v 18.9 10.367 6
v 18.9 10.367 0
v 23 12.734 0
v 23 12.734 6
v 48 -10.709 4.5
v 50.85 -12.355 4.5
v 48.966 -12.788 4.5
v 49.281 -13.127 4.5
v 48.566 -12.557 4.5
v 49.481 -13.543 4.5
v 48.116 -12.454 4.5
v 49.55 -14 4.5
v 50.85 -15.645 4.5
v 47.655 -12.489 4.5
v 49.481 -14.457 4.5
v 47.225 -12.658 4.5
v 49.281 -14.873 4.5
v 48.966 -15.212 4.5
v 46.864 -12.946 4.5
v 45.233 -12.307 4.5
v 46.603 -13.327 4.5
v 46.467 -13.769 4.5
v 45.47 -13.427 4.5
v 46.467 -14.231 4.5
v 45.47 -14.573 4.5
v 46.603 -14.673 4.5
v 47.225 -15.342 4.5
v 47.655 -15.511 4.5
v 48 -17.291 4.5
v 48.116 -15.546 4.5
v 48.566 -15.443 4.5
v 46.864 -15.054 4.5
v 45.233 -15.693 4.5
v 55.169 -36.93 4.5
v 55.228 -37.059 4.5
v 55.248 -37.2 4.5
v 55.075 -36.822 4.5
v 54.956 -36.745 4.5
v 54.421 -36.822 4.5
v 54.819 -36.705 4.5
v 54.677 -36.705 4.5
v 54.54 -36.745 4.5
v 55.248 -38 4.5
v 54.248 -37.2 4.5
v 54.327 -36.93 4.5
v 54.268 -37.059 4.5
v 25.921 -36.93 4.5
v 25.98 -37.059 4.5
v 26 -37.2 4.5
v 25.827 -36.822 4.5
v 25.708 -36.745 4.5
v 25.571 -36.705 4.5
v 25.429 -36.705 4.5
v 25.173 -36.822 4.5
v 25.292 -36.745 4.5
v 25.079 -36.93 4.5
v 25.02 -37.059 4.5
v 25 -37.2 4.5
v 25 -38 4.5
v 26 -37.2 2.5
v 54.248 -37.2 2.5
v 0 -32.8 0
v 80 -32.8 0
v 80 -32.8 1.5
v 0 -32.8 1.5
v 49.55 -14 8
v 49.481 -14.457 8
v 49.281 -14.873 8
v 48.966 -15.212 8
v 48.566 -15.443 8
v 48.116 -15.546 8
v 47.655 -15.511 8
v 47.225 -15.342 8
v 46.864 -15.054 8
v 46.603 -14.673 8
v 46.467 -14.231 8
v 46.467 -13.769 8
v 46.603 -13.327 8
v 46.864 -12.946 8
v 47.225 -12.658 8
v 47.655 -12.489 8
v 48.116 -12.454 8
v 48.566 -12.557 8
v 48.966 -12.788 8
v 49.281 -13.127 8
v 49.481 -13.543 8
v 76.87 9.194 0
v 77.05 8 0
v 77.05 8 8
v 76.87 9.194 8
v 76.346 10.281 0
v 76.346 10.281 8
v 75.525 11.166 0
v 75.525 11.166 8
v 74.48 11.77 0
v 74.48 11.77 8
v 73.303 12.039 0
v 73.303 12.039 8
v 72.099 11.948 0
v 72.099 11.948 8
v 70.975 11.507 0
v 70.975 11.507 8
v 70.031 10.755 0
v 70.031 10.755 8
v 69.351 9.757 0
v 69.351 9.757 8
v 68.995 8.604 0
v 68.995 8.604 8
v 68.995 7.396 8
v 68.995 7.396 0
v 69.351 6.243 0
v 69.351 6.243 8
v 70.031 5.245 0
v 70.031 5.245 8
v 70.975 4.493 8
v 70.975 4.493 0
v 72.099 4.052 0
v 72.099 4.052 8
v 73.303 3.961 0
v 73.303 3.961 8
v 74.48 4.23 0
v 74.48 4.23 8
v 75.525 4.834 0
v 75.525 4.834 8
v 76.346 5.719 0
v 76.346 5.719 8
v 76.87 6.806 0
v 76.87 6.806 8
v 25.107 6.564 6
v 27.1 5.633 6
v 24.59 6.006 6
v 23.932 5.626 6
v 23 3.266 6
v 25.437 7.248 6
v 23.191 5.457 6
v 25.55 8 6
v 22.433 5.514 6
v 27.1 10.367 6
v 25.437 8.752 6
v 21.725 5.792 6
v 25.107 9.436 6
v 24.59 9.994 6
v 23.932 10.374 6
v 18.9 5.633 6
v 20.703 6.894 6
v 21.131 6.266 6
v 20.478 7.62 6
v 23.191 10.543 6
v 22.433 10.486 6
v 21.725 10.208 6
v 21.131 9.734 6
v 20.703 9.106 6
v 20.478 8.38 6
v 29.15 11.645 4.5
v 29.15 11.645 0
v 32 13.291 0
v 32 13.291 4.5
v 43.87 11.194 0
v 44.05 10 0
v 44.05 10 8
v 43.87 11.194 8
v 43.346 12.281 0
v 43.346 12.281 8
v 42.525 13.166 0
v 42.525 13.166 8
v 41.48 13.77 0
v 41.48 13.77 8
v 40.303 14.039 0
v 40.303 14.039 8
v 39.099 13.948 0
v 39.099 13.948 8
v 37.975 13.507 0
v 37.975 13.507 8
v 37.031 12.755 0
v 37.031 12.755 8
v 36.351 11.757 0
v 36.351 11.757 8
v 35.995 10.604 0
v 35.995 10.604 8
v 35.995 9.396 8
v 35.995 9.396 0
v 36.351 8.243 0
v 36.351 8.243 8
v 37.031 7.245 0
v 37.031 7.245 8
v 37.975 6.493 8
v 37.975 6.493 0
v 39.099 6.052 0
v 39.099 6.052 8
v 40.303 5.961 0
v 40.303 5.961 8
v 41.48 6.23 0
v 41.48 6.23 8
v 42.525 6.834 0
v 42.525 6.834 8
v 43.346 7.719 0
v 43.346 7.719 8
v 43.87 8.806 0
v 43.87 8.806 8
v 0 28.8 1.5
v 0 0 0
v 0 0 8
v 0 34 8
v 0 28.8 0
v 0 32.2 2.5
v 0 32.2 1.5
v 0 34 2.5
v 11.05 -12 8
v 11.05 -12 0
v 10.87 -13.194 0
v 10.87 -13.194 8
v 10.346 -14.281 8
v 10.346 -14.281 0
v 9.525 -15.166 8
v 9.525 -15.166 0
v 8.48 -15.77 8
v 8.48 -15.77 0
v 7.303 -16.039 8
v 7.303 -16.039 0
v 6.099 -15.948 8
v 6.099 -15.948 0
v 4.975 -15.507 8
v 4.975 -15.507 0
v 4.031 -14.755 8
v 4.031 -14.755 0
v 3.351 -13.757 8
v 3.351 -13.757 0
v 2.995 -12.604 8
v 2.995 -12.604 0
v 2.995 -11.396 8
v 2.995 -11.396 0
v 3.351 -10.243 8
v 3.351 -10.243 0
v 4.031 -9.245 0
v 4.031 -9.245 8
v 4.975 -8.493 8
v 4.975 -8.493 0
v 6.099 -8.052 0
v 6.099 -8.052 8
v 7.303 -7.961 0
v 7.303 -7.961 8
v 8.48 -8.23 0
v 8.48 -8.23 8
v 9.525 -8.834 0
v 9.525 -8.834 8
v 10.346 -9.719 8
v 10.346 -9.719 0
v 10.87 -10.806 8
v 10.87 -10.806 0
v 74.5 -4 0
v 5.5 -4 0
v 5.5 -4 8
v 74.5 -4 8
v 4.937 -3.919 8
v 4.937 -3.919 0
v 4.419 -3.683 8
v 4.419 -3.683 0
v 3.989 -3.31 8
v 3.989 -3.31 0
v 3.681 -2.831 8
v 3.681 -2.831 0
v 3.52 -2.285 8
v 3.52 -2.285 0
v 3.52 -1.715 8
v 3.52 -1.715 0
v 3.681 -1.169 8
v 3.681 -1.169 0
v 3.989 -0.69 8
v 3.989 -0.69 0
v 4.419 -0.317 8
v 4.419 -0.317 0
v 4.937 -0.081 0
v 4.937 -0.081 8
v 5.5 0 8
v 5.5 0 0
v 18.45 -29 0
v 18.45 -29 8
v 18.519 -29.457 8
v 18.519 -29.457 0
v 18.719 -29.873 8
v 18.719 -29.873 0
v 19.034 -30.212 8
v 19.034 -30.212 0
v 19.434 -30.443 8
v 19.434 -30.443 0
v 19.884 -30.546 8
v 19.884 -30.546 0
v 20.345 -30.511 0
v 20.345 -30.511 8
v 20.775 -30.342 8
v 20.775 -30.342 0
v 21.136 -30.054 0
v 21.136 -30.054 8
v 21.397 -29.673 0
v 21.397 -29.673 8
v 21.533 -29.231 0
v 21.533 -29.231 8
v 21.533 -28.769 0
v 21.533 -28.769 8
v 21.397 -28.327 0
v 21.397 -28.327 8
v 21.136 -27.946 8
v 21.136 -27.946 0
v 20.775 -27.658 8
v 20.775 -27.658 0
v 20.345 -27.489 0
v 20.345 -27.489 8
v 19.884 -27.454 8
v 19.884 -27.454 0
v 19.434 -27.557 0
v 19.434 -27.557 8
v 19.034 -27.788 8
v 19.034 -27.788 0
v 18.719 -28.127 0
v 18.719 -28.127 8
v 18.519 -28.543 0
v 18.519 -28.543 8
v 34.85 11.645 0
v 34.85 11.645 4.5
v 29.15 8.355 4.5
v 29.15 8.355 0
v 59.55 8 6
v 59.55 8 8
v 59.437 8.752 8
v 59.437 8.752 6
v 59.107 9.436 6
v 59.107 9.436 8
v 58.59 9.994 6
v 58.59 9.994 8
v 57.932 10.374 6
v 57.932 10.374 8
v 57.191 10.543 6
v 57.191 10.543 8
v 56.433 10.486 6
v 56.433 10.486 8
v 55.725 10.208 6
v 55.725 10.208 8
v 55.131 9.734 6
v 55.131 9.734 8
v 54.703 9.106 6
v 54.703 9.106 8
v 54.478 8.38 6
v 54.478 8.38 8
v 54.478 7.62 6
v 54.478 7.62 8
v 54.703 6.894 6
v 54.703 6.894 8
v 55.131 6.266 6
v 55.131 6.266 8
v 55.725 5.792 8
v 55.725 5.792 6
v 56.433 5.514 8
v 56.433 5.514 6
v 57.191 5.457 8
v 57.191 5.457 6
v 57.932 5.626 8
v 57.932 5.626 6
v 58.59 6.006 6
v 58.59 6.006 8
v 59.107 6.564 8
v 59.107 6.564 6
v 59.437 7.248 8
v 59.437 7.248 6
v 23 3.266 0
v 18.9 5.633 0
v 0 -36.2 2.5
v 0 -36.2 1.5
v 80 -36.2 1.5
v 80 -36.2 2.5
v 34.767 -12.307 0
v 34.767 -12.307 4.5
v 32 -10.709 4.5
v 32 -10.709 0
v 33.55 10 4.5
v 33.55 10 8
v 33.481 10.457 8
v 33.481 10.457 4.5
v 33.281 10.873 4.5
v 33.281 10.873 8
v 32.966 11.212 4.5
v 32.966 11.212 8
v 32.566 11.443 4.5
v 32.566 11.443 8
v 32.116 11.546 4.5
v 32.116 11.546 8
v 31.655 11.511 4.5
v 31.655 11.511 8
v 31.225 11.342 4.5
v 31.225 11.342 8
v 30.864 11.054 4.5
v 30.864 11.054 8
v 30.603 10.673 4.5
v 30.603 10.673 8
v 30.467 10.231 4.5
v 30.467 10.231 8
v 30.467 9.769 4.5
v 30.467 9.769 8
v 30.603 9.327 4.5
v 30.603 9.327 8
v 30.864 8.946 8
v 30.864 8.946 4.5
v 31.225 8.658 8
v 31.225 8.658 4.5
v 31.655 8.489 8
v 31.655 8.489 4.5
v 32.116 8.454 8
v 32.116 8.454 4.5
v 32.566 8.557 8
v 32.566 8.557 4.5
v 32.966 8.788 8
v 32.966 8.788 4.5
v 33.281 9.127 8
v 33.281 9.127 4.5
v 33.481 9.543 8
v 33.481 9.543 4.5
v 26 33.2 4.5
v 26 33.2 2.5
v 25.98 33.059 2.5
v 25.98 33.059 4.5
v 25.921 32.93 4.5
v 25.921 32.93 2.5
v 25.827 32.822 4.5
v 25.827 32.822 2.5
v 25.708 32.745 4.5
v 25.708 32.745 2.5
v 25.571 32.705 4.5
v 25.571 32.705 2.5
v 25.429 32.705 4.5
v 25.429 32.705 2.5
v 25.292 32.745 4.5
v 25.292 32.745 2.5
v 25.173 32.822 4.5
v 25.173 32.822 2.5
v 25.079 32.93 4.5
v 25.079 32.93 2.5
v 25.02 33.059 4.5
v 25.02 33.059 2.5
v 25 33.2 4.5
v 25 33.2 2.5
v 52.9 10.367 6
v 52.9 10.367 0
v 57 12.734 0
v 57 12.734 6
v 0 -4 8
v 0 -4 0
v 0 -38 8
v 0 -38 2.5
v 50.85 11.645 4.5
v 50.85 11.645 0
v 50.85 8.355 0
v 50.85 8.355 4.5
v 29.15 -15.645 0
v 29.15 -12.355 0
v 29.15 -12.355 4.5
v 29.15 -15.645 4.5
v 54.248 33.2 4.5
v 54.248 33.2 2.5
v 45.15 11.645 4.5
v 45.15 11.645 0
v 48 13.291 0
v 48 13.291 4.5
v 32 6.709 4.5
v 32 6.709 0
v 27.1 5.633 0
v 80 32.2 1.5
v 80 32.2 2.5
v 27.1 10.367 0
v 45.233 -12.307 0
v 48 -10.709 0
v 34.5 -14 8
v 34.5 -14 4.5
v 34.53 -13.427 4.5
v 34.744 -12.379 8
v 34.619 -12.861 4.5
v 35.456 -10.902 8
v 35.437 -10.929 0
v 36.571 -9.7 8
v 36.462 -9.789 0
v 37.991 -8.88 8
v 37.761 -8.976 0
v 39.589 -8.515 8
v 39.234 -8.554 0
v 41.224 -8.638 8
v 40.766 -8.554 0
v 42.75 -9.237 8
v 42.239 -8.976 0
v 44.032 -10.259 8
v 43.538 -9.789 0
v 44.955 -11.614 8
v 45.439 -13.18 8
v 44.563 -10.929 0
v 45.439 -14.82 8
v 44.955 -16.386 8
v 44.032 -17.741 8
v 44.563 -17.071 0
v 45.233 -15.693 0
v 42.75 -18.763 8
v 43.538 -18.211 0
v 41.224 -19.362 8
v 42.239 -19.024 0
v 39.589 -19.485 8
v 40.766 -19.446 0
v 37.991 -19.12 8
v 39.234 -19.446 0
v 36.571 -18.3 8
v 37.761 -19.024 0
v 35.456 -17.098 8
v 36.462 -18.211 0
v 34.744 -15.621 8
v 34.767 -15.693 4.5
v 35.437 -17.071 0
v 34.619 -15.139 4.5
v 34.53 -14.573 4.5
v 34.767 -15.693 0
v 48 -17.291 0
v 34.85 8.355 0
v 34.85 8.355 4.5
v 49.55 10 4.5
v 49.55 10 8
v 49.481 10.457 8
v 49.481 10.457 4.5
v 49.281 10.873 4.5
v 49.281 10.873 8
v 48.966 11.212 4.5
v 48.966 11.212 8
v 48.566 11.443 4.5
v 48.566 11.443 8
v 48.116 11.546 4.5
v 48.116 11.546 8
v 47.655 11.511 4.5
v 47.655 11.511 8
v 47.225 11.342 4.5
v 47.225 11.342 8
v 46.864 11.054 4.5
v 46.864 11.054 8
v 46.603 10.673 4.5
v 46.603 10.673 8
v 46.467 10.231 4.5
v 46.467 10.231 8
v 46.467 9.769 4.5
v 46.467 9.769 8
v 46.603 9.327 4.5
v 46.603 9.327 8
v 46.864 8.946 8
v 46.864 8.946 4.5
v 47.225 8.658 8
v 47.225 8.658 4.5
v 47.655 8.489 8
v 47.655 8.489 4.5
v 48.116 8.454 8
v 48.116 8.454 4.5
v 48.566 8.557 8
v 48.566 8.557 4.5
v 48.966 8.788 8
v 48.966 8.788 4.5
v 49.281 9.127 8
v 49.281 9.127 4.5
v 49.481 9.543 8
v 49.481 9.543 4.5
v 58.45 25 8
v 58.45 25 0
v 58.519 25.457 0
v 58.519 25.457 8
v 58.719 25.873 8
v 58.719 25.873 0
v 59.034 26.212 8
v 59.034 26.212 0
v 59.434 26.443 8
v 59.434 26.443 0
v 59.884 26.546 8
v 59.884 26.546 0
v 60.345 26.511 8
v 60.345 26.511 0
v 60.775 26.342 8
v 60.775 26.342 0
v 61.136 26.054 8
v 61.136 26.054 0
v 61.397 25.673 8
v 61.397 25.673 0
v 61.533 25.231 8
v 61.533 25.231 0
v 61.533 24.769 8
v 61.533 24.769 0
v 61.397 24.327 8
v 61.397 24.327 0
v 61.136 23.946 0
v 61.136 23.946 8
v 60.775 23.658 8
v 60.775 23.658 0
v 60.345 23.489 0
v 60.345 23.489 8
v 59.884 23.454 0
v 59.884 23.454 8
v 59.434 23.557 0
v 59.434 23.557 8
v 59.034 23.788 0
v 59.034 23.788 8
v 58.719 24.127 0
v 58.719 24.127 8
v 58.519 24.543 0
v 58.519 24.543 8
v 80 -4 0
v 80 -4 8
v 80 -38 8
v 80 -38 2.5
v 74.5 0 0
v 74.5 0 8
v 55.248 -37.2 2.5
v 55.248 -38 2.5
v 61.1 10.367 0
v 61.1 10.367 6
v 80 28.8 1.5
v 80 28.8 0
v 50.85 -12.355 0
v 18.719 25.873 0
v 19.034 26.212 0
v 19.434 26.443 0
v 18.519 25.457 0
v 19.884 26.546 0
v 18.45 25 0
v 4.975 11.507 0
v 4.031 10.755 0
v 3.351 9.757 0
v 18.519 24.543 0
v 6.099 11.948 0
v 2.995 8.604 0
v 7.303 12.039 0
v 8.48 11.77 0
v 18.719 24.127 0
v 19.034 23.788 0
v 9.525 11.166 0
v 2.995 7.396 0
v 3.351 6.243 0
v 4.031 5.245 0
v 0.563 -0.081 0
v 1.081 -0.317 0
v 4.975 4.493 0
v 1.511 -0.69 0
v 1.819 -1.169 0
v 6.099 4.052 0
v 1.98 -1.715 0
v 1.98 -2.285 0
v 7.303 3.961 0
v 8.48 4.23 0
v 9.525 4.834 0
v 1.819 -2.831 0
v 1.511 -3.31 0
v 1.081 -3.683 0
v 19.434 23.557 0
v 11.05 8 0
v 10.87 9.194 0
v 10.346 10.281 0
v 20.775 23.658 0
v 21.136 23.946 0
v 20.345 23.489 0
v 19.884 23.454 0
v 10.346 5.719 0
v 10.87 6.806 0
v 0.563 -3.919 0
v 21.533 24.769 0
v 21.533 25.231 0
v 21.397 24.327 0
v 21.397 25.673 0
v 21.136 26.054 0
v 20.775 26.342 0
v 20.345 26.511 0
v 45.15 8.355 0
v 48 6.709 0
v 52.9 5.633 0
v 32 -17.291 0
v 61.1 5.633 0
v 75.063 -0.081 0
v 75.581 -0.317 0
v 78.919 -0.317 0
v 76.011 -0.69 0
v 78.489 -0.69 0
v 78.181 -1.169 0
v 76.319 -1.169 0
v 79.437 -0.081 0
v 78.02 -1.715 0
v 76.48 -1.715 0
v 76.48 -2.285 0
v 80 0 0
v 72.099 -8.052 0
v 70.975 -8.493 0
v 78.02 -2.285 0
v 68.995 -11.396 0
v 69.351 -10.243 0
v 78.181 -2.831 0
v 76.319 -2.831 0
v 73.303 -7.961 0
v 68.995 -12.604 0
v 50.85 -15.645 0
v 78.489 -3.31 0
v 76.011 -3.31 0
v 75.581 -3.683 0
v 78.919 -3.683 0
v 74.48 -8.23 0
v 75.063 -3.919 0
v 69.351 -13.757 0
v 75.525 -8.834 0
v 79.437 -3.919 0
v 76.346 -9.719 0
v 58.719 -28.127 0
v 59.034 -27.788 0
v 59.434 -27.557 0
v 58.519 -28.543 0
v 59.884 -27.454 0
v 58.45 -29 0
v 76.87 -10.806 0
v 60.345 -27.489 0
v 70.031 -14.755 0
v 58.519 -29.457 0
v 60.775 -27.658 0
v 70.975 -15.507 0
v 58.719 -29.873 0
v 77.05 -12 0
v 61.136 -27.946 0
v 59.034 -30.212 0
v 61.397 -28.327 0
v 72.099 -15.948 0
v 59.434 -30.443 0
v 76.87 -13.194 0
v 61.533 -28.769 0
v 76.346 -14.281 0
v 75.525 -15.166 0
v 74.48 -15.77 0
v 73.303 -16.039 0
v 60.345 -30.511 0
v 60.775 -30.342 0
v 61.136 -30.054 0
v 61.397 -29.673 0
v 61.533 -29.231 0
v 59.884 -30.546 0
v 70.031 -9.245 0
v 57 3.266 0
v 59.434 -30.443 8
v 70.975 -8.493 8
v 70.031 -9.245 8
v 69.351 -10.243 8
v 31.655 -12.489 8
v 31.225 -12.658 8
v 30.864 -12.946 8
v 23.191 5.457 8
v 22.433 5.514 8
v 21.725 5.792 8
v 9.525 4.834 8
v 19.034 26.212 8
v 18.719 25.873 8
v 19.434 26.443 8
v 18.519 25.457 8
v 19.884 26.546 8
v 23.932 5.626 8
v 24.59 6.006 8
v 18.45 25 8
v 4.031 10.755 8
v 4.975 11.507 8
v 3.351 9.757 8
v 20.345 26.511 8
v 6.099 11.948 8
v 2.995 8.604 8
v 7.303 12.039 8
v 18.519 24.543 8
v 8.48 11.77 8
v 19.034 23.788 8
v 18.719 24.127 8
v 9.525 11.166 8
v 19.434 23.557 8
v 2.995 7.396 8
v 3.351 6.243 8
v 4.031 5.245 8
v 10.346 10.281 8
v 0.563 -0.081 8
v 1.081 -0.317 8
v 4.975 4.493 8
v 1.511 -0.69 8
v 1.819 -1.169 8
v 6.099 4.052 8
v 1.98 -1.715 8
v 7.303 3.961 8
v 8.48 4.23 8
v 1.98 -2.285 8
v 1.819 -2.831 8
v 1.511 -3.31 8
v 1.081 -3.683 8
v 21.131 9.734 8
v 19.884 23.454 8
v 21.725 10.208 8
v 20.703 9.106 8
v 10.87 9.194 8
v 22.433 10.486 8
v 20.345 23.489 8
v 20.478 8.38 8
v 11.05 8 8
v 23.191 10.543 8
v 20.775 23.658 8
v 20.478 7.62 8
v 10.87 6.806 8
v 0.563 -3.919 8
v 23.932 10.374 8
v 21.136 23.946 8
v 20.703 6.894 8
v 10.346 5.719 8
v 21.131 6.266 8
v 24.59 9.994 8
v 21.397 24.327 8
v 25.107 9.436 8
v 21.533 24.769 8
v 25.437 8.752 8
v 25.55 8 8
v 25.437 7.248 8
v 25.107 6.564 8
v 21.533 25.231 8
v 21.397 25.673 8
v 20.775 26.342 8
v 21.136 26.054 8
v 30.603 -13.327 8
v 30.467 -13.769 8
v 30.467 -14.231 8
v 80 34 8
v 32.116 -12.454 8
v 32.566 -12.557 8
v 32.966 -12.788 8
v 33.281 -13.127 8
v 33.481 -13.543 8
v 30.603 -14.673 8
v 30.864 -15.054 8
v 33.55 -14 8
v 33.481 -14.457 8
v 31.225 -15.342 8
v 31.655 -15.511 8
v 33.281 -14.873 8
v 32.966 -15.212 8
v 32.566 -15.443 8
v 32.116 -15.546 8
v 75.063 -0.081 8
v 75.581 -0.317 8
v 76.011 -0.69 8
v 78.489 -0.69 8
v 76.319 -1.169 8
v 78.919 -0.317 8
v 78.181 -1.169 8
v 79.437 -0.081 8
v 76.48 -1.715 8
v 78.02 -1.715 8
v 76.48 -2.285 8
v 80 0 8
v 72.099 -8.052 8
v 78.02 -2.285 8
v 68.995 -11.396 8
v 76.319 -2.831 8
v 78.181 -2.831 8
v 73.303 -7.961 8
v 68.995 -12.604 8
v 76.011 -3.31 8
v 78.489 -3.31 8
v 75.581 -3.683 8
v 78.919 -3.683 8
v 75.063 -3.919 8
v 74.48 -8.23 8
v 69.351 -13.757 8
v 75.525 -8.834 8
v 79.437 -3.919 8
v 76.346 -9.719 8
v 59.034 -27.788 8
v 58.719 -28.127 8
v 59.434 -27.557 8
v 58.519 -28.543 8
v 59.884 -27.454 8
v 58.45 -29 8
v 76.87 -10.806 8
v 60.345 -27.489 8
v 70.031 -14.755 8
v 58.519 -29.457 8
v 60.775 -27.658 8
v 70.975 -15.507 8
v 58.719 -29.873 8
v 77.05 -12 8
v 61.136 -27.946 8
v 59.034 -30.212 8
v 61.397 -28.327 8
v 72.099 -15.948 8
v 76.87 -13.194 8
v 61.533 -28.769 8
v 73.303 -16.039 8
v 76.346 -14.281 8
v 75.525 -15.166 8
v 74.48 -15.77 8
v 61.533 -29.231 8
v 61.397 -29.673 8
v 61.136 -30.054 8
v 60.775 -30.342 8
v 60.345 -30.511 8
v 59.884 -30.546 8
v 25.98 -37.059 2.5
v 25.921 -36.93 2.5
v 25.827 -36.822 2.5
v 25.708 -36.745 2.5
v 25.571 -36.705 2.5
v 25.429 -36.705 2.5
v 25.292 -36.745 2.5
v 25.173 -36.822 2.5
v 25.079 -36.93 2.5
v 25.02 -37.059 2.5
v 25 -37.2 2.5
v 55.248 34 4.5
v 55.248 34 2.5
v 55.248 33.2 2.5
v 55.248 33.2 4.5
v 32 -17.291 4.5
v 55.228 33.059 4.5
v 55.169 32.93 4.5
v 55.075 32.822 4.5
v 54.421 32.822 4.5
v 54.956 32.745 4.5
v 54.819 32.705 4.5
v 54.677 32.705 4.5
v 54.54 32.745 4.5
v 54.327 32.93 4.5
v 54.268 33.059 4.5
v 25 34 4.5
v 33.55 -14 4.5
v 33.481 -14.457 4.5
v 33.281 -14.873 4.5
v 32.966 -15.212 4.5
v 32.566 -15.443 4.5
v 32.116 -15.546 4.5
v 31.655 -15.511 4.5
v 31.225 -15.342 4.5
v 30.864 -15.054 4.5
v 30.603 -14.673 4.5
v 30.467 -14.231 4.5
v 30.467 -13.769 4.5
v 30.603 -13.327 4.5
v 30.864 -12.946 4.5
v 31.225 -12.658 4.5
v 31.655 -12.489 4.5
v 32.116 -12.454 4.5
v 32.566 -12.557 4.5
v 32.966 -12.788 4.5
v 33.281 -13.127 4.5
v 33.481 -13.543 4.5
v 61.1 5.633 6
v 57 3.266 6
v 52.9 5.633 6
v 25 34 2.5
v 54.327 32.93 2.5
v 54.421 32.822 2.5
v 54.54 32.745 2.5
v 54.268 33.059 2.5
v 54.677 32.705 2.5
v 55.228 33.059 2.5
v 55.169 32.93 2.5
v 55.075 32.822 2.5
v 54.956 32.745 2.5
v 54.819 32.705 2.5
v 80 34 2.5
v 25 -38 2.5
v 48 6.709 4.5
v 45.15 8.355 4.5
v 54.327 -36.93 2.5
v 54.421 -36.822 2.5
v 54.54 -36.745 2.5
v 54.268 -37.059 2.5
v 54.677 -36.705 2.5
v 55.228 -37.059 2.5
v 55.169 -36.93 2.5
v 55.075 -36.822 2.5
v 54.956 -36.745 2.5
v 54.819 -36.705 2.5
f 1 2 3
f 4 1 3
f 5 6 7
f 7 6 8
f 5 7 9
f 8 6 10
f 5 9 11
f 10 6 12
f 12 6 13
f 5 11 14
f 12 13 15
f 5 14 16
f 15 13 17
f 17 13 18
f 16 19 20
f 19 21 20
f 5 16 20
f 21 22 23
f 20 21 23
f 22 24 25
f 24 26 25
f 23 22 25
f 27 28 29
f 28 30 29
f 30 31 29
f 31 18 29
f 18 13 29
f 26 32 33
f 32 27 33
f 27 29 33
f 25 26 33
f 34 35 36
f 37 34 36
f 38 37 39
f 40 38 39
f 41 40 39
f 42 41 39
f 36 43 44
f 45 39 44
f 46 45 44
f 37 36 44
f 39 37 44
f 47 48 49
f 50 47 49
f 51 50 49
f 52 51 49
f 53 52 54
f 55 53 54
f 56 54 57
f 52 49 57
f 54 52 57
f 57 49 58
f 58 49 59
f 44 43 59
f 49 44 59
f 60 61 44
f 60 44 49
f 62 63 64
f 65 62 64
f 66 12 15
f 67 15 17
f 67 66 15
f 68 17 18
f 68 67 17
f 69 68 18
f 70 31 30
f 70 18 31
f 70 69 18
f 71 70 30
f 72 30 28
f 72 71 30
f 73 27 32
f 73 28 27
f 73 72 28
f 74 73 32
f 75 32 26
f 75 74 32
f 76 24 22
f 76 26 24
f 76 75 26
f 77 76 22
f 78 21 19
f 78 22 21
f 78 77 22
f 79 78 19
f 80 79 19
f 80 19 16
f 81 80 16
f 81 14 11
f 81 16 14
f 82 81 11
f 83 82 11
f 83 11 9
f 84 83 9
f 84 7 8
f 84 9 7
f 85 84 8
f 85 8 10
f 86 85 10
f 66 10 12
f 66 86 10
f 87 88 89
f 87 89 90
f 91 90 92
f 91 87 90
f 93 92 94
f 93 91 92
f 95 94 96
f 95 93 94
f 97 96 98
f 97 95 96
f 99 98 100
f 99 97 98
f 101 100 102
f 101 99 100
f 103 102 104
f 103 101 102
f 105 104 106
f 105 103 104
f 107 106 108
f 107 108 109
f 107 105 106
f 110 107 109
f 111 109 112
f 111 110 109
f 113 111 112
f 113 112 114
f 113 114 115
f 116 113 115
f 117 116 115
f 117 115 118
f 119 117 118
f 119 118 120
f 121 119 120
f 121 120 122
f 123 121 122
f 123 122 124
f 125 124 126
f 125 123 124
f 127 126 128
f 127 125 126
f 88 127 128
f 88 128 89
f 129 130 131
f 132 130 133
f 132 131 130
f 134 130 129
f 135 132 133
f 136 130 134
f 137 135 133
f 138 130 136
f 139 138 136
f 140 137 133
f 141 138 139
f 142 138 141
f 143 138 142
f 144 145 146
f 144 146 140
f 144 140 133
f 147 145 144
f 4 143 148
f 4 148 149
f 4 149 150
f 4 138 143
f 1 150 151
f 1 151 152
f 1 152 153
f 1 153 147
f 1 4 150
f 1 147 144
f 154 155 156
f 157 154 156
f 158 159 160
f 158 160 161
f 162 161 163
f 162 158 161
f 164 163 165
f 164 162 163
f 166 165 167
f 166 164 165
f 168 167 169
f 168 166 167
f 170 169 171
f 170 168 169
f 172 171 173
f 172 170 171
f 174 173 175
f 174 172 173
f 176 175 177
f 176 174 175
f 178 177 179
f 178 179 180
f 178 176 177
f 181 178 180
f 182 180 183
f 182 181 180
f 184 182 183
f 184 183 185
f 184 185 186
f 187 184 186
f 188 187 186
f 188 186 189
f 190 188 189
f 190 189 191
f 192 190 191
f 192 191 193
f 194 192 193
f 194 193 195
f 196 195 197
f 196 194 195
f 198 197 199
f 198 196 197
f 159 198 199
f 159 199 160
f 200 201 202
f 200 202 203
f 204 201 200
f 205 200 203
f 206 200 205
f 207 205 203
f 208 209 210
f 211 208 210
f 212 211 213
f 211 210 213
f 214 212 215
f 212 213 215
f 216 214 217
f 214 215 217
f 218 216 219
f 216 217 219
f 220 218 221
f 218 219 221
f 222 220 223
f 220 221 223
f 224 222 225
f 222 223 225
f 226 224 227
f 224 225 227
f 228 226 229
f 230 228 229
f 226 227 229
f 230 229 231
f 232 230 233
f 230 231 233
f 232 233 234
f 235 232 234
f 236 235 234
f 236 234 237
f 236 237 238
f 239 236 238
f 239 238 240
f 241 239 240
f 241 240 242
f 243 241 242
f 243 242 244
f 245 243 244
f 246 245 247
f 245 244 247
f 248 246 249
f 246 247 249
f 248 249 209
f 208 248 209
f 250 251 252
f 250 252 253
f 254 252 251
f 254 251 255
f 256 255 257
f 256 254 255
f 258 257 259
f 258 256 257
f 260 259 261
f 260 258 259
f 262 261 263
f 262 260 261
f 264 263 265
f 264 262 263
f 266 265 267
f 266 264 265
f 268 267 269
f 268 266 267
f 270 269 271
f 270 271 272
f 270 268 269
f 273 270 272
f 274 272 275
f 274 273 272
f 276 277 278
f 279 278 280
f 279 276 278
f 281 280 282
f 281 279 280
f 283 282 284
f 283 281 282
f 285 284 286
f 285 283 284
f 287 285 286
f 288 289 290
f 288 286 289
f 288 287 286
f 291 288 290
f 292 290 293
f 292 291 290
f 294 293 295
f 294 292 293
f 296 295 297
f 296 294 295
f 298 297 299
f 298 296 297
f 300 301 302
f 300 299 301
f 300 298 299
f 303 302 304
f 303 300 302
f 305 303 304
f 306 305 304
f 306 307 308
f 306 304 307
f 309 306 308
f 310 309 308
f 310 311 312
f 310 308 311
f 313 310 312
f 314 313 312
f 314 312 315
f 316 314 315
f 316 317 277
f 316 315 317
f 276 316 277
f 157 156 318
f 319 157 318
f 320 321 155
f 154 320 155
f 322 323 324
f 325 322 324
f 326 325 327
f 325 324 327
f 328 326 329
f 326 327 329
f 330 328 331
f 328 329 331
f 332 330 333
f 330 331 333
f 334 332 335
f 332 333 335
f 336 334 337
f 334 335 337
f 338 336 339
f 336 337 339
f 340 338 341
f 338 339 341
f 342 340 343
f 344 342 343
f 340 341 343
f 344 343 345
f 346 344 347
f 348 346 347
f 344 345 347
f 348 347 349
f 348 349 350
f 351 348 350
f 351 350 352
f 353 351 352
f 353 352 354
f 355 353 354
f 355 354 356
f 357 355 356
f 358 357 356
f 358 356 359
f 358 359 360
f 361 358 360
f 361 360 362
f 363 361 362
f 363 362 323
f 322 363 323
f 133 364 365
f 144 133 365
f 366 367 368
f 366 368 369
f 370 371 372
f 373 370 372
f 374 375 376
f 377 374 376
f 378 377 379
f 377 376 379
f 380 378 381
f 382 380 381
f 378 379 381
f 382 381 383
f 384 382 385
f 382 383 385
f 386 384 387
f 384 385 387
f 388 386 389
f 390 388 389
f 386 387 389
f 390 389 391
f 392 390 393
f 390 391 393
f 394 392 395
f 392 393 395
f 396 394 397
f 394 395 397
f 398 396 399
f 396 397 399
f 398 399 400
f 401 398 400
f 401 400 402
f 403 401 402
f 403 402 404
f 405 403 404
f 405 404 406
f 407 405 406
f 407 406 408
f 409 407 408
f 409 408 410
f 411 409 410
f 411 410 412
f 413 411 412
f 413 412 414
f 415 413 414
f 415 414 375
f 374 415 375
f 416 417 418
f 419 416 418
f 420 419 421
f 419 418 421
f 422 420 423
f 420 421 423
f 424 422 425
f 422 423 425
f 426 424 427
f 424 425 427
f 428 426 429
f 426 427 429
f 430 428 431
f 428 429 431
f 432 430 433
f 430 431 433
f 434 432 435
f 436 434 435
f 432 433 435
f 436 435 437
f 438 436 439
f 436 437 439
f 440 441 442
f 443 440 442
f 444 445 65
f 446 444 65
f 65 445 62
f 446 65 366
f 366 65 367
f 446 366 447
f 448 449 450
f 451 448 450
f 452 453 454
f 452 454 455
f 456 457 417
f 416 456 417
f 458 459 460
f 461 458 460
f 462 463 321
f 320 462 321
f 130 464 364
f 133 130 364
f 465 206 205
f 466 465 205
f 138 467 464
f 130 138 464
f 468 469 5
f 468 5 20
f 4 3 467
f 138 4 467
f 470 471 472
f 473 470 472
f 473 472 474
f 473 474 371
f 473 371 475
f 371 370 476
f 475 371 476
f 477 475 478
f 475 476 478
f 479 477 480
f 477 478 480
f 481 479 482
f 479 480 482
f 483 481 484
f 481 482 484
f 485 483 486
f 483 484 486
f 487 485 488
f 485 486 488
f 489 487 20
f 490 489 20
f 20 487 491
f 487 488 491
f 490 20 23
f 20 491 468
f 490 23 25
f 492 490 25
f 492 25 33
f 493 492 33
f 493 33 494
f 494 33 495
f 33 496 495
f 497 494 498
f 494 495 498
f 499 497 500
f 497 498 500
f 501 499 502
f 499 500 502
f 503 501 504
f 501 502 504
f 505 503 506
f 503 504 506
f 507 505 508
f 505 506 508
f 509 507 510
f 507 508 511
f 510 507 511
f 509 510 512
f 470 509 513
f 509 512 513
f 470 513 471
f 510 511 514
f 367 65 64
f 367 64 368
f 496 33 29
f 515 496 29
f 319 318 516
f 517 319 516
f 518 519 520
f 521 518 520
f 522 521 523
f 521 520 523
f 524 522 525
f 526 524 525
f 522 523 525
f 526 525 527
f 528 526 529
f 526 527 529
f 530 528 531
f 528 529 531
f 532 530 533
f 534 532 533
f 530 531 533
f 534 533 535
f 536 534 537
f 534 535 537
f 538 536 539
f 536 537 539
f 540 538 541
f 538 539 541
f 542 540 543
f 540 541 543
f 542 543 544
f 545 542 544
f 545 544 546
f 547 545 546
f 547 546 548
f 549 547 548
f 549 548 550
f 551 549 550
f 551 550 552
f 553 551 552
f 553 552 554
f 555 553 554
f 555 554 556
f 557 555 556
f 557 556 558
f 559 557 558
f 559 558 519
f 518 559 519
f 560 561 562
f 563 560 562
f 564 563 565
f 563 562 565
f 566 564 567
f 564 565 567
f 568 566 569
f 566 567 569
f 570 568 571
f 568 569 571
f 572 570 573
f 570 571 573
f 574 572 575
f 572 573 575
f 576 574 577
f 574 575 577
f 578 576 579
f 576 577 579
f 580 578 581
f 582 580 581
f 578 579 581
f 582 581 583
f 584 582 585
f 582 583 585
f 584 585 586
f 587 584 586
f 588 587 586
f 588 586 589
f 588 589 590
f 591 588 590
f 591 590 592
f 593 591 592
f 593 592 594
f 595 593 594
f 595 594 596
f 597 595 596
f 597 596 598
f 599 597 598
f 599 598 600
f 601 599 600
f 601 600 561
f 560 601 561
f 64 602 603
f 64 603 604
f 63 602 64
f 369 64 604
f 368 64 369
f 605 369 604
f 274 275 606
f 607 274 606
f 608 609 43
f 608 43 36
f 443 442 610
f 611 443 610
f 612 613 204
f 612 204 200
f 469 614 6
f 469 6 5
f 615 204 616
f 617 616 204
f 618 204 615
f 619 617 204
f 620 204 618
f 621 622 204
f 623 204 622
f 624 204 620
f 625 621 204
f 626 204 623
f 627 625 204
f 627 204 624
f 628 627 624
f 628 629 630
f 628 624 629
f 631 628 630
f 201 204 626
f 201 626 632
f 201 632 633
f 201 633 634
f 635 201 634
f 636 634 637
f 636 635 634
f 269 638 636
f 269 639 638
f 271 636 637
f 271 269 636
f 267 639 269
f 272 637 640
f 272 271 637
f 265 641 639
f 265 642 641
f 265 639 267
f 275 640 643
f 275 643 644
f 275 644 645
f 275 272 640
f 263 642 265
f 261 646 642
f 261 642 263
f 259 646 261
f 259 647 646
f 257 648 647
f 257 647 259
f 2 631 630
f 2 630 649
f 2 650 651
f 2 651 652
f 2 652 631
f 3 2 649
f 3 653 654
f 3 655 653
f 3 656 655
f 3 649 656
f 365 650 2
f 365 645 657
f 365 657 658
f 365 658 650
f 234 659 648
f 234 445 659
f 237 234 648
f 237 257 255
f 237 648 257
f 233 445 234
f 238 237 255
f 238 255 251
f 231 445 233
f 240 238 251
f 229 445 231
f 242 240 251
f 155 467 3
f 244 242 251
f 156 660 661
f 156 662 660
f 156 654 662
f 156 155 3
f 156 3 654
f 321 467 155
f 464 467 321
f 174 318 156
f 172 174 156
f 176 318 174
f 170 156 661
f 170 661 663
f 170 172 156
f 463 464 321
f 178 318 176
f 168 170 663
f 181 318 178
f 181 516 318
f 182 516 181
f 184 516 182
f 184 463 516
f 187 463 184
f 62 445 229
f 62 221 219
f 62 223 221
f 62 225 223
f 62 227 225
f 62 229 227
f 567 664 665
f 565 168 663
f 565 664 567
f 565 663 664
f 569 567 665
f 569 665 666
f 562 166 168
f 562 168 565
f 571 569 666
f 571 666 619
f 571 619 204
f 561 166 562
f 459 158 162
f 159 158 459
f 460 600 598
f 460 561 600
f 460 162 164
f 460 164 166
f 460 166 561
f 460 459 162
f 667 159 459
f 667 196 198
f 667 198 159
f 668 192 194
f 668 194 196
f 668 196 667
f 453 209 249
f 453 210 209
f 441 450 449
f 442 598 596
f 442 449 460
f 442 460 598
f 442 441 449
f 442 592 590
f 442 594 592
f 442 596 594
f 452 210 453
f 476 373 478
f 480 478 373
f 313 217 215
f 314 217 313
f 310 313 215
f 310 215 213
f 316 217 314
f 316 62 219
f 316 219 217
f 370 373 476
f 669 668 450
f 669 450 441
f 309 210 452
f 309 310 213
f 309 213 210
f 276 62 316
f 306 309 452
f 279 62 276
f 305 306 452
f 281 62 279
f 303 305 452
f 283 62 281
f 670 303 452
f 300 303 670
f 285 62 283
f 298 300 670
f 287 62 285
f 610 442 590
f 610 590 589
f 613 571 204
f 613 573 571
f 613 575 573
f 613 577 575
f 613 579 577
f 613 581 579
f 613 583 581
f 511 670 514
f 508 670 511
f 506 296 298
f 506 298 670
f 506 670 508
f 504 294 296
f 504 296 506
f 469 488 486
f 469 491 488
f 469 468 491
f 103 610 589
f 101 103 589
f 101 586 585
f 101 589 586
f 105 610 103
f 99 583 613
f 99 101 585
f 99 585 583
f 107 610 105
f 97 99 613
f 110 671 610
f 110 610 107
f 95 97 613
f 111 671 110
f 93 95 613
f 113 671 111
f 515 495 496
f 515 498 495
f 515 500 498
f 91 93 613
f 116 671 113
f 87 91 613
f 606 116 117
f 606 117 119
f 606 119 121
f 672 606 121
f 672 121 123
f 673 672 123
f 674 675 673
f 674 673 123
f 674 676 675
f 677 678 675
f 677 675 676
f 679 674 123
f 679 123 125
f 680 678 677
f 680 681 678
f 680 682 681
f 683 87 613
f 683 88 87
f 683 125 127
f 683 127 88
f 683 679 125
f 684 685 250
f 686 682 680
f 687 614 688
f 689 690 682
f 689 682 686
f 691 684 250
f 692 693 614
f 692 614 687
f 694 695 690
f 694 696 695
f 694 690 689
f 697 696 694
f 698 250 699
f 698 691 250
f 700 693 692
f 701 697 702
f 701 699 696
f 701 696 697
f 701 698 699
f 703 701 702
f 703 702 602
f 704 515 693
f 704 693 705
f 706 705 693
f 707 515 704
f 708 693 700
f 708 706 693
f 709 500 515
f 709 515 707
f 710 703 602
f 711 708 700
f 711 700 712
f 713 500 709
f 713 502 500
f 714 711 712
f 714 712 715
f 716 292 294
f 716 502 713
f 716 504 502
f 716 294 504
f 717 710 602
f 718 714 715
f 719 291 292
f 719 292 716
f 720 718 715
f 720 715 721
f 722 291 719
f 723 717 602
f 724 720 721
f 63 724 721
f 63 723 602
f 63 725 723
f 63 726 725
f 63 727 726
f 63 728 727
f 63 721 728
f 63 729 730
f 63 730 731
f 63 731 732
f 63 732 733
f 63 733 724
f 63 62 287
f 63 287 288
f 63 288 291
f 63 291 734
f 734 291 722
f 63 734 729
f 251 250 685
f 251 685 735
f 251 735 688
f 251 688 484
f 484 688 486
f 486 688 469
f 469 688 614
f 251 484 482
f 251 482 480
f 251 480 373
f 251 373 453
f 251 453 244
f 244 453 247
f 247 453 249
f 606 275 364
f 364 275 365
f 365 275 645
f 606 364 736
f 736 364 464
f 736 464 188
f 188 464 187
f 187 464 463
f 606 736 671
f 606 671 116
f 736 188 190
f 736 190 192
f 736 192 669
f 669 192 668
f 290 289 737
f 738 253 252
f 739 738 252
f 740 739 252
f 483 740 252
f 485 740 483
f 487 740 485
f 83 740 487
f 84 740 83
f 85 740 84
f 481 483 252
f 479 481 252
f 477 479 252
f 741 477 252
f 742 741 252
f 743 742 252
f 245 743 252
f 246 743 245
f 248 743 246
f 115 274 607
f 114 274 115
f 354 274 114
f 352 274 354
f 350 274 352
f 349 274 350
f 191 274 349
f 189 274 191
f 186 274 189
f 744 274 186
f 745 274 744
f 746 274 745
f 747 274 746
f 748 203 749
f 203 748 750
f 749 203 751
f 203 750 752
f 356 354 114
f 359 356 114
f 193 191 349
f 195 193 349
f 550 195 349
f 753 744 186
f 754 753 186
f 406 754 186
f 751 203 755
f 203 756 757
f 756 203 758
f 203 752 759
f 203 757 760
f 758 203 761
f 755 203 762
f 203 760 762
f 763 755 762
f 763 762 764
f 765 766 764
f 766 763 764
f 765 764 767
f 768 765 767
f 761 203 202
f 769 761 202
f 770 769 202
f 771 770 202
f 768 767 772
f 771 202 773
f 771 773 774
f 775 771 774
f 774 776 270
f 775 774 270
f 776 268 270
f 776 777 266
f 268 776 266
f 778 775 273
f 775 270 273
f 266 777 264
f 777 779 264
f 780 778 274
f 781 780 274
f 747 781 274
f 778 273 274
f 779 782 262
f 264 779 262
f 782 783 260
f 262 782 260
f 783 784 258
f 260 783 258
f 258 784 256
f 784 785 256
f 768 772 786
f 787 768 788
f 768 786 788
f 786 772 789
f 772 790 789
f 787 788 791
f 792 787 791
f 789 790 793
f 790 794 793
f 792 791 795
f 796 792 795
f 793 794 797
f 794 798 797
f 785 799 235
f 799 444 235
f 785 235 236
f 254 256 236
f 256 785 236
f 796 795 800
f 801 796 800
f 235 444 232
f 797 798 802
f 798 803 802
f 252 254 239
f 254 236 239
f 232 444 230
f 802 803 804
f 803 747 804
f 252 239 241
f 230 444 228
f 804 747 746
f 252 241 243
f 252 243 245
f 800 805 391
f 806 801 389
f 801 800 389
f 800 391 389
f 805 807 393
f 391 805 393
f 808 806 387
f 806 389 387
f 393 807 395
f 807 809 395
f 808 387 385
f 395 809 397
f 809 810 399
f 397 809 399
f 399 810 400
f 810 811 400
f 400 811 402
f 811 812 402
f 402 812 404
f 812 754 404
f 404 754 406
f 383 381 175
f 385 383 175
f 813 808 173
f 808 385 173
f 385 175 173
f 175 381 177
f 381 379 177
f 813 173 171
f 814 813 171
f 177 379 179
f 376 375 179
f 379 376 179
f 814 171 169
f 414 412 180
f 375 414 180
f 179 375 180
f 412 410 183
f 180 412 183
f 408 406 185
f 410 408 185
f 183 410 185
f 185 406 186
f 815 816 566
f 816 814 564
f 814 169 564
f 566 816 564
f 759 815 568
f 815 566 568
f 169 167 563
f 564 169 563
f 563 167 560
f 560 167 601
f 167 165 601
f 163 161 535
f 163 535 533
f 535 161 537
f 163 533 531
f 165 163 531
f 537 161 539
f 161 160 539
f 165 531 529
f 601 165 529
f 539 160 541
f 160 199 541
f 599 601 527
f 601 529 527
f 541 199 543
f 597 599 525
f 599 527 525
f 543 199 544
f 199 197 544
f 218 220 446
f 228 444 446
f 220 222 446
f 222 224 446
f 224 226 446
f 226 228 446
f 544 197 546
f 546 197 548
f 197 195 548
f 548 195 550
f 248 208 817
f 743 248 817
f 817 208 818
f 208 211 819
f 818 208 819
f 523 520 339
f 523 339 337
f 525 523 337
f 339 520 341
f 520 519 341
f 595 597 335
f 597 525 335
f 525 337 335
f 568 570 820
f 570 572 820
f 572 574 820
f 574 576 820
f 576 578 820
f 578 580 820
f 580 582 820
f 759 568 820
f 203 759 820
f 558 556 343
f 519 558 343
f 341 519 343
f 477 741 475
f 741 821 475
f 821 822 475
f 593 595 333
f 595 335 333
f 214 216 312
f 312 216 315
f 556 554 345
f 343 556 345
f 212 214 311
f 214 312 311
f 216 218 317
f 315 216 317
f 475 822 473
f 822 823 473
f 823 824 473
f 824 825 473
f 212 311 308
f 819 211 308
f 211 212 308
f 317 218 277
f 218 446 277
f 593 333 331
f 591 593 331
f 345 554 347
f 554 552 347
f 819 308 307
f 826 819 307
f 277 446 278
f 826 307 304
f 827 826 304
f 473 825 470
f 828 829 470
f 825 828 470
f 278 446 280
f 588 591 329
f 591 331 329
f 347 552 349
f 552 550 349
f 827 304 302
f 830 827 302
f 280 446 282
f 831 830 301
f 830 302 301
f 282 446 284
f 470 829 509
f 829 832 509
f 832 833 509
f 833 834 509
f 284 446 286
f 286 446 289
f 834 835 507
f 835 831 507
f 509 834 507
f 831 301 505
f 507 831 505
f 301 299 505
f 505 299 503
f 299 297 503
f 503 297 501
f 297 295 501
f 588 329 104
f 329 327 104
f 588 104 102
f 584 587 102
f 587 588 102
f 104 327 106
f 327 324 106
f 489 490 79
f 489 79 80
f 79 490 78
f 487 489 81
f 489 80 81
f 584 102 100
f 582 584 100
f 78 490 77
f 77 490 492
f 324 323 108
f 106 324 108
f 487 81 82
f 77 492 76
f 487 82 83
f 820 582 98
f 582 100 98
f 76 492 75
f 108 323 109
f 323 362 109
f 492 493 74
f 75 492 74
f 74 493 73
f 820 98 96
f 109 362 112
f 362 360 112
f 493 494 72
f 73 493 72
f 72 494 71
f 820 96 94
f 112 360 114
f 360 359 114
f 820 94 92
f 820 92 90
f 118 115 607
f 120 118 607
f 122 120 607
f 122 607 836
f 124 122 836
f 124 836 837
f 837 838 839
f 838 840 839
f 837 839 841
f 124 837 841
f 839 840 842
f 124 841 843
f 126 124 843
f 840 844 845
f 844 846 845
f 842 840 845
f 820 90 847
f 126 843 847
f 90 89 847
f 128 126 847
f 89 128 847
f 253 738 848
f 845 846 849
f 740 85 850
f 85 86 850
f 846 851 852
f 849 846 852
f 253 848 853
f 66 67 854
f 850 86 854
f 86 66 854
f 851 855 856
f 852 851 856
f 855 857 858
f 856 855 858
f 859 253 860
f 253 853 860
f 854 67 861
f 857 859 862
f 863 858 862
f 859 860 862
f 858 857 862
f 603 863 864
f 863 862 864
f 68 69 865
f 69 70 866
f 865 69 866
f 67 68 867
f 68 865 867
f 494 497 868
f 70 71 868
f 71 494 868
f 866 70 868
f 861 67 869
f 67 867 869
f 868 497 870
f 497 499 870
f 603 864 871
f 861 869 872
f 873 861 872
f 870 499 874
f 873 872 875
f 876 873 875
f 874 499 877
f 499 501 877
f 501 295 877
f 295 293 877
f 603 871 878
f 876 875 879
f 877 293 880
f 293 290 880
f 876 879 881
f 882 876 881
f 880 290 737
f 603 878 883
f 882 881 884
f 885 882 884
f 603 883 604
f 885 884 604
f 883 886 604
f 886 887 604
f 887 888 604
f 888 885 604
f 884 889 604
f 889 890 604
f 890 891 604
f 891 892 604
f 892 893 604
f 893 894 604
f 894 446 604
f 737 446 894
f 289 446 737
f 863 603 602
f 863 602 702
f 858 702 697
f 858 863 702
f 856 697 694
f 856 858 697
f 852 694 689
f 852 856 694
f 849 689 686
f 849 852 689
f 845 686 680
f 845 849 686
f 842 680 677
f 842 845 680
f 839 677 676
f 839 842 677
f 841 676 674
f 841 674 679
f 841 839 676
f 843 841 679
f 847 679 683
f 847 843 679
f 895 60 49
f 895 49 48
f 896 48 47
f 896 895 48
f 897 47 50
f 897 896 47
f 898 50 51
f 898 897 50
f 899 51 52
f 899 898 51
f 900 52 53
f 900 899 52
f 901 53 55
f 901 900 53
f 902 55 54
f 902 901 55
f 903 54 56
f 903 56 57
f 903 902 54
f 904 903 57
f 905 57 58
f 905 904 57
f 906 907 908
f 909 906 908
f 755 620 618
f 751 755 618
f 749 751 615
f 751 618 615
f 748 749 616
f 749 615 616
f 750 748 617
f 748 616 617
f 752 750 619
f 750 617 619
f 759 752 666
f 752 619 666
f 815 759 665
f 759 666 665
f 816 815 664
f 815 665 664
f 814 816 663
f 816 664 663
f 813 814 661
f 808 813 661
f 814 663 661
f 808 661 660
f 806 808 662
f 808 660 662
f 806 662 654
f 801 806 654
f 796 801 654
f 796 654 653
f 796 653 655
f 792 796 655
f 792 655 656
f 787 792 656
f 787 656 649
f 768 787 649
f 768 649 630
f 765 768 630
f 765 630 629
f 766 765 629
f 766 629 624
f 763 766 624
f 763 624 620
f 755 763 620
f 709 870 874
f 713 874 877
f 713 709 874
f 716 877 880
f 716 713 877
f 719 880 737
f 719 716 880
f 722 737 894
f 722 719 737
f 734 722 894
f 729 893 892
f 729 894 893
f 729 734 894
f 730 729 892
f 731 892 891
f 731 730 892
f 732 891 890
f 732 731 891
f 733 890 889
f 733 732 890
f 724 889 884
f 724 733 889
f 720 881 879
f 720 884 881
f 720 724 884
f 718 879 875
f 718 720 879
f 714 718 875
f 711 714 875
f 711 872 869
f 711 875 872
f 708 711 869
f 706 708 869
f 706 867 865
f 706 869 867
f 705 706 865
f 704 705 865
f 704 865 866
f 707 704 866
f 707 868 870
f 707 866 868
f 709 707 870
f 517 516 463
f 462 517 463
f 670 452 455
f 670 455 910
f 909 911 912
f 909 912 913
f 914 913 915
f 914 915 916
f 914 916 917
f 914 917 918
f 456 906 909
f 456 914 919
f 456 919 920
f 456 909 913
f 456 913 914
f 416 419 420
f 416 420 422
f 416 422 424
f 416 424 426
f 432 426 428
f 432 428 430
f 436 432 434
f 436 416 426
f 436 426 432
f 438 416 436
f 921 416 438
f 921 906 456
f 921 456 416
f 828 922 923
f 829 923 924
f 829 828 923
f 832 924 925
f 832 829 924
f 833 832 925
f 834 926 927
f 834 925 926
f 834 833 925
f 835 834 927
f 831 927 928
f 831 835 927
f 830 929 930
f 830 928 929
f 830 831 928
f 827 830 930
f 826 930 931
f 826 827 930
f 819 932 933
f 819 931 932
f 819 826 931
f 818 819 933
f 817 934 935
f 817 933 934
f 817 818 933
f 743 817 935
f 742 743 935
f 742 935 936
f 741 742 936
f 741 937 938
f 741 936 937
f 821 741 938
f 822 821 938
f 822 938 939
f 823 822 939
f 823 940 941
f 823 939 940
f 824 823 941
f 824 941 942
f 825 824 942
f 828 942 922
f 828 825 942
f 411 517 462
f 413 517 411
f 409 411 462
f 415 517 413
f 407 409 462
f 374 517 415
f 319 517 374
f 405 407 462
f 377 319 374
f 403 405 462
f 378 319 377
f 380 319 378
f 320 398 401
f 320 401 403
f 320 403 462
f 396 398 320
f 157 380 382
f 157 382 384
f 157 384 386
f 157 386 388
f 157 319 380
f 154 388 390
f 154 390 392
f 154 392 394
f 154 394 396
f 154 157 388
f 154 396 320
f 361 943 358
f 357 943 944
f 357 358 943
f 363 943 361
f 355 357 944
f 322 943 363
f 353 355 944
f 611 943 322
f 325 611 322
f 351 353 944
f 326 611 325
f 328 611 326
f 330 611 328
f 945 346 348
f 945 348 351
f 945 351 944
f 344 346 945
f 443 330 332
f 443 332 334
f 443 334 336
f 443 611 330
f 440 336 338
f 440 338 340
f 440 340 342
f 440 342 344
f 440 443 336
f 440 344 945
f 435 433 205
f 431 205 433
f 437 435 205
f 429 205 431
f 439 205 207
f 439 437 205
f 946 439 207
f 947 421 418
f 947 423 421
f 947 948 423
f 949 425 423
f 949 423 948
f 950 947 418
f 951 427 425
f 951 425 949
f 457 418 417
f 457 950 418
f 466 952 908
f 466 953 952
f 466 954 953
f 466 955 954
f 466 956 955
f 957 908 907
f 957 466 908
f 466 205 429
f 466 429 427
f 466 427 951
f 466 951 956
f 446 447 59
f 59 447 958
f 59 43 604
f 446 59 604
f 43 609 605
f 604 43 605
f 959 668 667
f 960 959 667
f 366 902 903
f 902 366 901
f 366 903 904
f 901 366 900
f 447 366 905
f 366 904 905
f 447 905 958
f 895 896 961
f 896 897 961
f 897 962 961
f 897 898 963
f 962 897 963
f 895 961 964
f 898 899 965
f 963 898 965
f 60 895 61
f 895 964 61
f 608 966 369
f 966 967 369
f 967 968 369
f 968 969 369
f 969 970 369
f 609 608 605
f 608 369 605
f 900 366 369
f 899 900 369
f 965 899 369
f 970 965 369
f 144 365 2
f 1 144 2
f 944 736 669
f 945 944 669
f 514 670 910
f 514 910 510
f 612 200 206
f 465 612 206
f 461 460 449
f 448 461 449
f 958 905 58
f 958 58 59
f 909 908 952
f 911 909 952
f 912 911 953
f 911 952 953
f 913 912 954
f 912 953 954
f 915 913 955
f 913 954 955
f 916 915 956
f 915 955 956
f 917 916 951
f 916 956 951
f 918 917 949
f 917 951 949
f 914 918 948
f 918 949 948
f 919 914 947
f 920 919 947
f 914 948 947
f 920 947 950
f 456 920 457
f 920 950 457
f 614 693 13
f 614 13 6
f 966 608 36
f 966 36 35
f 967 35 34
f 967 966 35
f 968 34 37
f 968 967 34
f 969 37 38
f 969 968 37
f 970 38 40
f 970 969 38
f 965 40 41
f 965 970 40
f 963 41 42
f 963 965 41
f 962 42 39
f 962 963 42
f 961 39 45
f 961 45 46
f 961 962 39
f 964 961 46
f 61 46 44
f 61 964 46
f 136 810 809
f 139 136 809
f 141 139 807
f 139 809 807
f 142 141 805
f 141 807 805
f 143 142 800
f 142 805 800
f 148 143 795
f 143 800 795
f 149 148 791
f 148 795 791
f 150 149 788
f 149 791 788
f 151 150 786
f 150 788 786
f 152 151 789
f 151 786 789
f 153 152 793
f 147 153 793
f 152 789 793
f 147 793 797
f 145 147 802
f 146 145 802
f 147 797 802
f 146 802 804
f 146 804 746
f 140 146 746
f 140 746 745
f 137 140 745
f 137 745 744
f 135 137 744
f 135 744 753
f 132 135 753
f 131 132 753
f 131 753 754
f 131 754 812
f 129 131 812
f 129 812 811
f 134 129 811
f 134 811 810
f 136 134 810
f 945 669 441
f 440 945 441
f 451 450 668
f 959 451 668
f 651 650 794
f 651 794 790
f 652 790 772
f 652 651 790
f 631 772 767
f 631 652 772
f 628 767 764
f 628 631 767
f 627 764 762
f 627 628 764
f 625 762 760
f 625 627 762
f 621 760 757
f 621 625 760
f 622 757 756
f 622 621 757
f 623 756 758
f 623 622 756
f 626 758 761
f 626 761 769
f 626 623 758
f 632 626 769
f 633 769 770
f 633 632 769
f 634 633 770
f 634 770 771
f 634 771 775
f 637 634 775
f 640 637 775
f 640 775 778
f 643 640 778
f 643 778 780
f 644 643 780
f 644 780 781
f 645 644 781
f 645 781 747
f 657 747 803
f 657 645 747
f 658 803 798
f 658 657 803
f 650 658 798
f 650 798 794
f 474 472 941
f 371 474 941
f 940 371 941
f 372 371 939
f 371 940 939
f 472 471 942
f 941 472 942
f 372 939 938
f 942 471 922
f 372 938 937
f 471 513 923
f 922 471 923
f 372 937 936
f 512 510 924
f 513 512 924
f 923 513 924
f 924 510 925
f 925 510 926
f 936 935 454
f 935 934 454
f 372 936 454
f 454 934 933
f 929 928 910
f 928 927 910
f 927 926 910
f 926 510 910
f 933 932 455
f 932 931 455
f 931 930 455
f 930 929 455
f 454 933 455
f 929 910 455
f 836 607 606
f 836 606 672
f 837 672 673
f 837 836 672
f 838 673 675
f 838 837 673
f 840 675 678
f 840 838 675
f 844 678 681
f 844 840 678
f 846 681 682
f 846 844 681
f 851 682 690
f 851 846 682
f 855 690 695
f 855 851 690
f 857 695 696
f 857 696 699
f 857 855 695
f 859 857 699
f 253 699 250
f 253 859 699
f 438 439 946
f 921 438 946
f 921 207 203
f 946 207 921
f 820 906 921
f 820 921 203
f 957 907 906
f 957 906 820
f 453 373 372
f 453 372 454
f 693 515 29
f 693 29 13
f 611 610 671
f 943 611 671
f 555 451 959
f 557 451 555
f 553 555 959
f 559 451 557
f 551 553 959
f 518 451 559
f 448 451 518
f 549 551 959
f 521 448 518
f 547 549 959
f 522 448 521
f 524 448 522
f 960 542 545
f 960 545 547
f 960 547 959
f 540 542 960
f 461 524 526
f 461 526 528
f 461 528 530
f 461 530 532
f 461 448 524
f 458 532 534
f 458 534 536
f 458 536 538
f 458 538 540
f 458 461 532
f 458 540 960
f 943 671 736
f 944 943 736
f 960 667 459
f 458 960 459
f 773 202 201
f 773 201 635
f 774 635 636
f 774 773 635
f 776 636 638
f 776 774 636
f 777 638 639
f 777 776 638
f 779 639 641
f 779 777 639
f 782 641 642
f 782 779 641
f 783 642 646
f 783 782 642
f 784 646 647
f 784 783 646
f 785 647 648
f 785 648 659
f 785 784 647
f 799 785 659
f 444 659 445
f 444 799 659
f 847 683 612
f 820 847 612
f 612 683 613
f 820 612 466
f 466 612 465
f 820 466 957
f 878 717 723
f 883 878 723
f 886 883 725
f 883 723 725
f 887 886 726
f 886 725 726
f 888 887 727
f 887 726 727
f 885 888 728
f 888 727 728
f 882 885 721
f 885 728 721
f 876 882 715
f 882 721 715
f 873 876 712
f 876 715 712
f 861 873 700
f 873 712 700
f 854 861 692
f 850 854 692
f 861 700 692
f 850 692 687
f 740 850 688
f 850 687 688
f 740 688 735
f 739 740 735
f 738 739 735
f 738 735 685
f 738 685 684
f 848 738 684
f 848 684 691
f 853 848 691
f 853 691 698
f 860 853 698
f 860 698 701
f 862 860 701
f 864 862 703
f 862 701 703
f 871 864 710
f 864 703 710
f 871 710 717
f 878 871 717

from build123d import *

# Parameters (mm, degrees)
SKETCH_2_W           = 80
SKETCH_2_H           = 34
SKETCH_2_R           = 4.05
EXTRUDE_1_DEPTH      = 8
SKETCH_3_R           = 2.55
CUT_EXTRUDE_1_DEPTH  = 88.292611371
CUT_EXTRUDE_2_DEPTH  = 88.292611371
SKETCH_5_R           = 1.55
CUT_EXTRUDE_3_DEPTH  = 88.292611371
CUT_EXTRUDE_4_DEPTH  = 6
CUT_EXTRUDE_5_DEPTH  = 4.5
SKETCH_25_R          = 1.55
CUT_EXTRUDE_13_DEPTH = 88.292611371
CUT_EXTRUDE_11_DEPTH = 2
EXTRUDE_2_DEPTH      = 8
SKETCH_26_R          = 5.5
CUT_EXTRUDE_14_DEPTH = 89.926936302


with BuildPart() as part:
    # 草图2 → 凸台-拉伸1 (new body)
    with BuildSketch(Plane.XY):
        with Locations((40, 17)):
            Rectangle(SKETCH_2_W, SKETCH_2_H)
        with Locations((7, 8)):
            Circle(SKETCH_2_R, mode=Mode.SUBTRACT)
        with Locations((40, 10)):
            Circle(SKETCH_2_R, mode=Mode.SUBTRACT)
        with Locations((73, 8)):
            Circle(SKETCH_2_R, mode=Mode.SUBTRACT)
    extrude_1 = extrude(amount=EXTRUDE_1_DEPTH)

    # 草图3 → 切除-拉伸1 (cut, through all)
    with BuildSketch(Plane.XY.offset(8)):
        with Locations((23, 8)):
            Circle(SKETCH_3_R)
        with Locations((57, 8)):
            Circle(SKETCH_3_R)
    extrude(amount=-CUT_EXTRUDE_1_DEPTH, mode=Mode.SUBTRACT)

    # 草图4 → 切除-拉伸2 (cut, through all)
    with BuildSketch(Plane(origin=(80, 0, 0), x_dir=(0, 0, -1), z_dir=(1, 0, 0))):
        Polygon((-1.5, 32.2), (-2.5, 32.2), (-2.5, 34), (0, 34), (0, 28.8), (-1.5, 28.8), align=None)
    cut_extrude_2 = extrude(amount=-CUT_EXTRUDE_2_DEPTH, mode=Mode.SUBTRACT)

    # 草图5 → 切除-拉伸3 (cut, through all)
    with BuildSketch(Plane.XY.offset(8)):
        with Locations((48, 10)):
            Circle(SKETCH_5_R)
        with Locations((32, 10)):
            Circle(SKETCH_5_R)
    cut_extrude_3 = extrude(amount=-CUT_EXTRUDE_3_DEPTH, mode=Mode.SUBTRACT)

    # 草图7 → 切除-拉伸4 (cut)
    with BuildSketch(Plane(origin=(0, 0, 0), x_dir=(-1, 0, 0), z_dir=(0, 0, -1))):
        Polygon((-52.9, 5.632863896), (-52.9, 10.367136104), (-57, 12.734272207), (-61.1, 10.367136104), (-61.1, 5.632863896), (-57, 3.265727793), align=None)
        Polygon((-27.1, 5.632863896), (-23, 3.265727793), (-18.9, 5.632863896), (-18.9, 10.367136104), (-23, 12.734272207), (-27.1, 10.367136104), align=None)
    extrude(amount=-CUT_EXTRUDE_4_DEPTH, mode=Mode.SUBTRACT)

    # 草图8 → 切除-拉伸5 (cut)
    with BuildSketch(Plane(origin=(0, 0, 0), x_dir=(-1, 0, 0), z_dir=(0, 0, -1))):
        Polygon((-48, 6.709103466), (-45.15, 8.354551733), (-45.15, 11.645448267), (-48, 13.290896534), (-50.85, 11.645448267), (-50.85, 8.354551733), align=None)
        Polygon((-32, 6.709103466), (-29.15, 8.354551733), (-29.15, 11.645448267), (-32, 13.290896534), (-34.85, 11.645448267), (-34.85, 8.354551733), align=None)
    cut_extrude_5 = extrude(amount=-CUT_EXTRUDE_5_DEPTH, mode=Mode.SUBTRACT)

    # 草图25 → 切除-拉伸13 (cut, through all)
    with BuildSketch(Plane(origin=(0, 0, 0), x_dir=(-1, 0, 0), z_dir=(0, 0, -1))):
        with Locations((-60, 25)):
            Circle(SKETCH_25_R)
        with Locations((-20, 25)):
            Circle(SKETCH_25_R)
    cut_extrude_13 = extrude(amount=-CUT_EXTRUDE_13_DEPTH, mode=Mode.SUBTRACT)

    # 草图19 → 切除-拉伸11 (cut)
    with BuildSketch(Plane(origin=(0, 0, 2.5), x_dir=(-1, 0, 0), z_dir=(0, 0, -1))):
        with BuildLine():
            Line((-25, 34), (-55.247938178, 34))
            Line((-55.247938178, 34), (-55.247938178, 33.2))
            ThreePointArc((-55.247938178, 33.2), (-54.747938178, 32.7), (-54.247938178, 33.2))
            Line((-54.247938178, 33.2), (-26, 33.2))
            ThreePointArc((-26, 33.2), (-25.5, 32.7), (-25, 33.2))
            Line((-25, 33.2), (-25, 34))
        make_face()
    cut_extrude_11 = extrude(amount=-CUT_EXTRUDE_11_DEPTH, mode=Mode.SUBTRACT)

    # 草图22 → 凸台-拉伸2 (add)
    with BuildSketch(Plane.XY.offset(8)):
        with BuildLine():
            Line((0, -4), (5.5, -4))
            ThreePointArc((5.5, -4), (3.5, -2), (5.5, 0))
            Line((5.5, 0), (0, 0))
            ThreePointArc((0, 0), (2, -2), (0, -4))
        make_face()
        with BuildLine():
            Line((80, 0), (74.5, 0))
            ThreePointArc((74.5, 0), (76.5, -2), (74.5, -4))
            Line((74.5, -4), (80, -4))
            ThreePointArc((80, -4), (78, -2), (80, 0))
        make_face()
    extrude(amount=-EXTRUDE_2_DEPTH)

    # 镜向2: 凸台-拉伸1, 切除-拉伸2, 切除-拉伸3, 切除-拉伸5, 切除-拉伸13, 切除-拉伸11 across plane
    add(extrude_1.mirror(Plane(origin=(0, -2, 0), x_dir=(0, 0, 1), z_dir=(0, -1, 0))))
    add(cut_extrude_2.mirror(Plane(origin=(0, -2, 0), x_dir=(0, 0, 1), z_dir=(0, -1, 0))), mode=Mode.SUBTRACT)
    add(cut_extrude_3.mirror(Plane(origin=(0, -2, 0), x_dir=(0, 0, 1), z_dir=(0, -1, 0))), mode=Mode.SUBTRACT)
    add(cut_extrude_5.mirror(Plane(origin=(0, -2, 0), x_dir=(0, 0, 1), z_dir=(0, -1, 0))), mode=Mode.SUBTRACT)
    add(cut_extrude_13.mirror(Plane(origin=(0, -2, 0), x_dir=(0, 0, 1), z_dir=(0, -1, 0))), mode=Mode.SUBTRACT)
    add(cut_extrude_11.mirror(Plane(origin=(0, -2, 0), x_dir=(0, 0, 1), z_dir=(0, -1, 0))), mode=Mode.SUBTRACT)

    # 草图26 → 切除-拉伸14 (cut, through all)
    with BuildSketch(Plane(origin=(0, 0, 0), x_dir=(-1, 0, 0), z_dir=(0, 0, -1))):
        with Locations((-40, -14)):
            Circle(SKETCH_26_R)
    extrude(amount=-CUT_EXTRUDE_14_DEPTH, mode=Mode.SUBTRACT)


solid = part.part
